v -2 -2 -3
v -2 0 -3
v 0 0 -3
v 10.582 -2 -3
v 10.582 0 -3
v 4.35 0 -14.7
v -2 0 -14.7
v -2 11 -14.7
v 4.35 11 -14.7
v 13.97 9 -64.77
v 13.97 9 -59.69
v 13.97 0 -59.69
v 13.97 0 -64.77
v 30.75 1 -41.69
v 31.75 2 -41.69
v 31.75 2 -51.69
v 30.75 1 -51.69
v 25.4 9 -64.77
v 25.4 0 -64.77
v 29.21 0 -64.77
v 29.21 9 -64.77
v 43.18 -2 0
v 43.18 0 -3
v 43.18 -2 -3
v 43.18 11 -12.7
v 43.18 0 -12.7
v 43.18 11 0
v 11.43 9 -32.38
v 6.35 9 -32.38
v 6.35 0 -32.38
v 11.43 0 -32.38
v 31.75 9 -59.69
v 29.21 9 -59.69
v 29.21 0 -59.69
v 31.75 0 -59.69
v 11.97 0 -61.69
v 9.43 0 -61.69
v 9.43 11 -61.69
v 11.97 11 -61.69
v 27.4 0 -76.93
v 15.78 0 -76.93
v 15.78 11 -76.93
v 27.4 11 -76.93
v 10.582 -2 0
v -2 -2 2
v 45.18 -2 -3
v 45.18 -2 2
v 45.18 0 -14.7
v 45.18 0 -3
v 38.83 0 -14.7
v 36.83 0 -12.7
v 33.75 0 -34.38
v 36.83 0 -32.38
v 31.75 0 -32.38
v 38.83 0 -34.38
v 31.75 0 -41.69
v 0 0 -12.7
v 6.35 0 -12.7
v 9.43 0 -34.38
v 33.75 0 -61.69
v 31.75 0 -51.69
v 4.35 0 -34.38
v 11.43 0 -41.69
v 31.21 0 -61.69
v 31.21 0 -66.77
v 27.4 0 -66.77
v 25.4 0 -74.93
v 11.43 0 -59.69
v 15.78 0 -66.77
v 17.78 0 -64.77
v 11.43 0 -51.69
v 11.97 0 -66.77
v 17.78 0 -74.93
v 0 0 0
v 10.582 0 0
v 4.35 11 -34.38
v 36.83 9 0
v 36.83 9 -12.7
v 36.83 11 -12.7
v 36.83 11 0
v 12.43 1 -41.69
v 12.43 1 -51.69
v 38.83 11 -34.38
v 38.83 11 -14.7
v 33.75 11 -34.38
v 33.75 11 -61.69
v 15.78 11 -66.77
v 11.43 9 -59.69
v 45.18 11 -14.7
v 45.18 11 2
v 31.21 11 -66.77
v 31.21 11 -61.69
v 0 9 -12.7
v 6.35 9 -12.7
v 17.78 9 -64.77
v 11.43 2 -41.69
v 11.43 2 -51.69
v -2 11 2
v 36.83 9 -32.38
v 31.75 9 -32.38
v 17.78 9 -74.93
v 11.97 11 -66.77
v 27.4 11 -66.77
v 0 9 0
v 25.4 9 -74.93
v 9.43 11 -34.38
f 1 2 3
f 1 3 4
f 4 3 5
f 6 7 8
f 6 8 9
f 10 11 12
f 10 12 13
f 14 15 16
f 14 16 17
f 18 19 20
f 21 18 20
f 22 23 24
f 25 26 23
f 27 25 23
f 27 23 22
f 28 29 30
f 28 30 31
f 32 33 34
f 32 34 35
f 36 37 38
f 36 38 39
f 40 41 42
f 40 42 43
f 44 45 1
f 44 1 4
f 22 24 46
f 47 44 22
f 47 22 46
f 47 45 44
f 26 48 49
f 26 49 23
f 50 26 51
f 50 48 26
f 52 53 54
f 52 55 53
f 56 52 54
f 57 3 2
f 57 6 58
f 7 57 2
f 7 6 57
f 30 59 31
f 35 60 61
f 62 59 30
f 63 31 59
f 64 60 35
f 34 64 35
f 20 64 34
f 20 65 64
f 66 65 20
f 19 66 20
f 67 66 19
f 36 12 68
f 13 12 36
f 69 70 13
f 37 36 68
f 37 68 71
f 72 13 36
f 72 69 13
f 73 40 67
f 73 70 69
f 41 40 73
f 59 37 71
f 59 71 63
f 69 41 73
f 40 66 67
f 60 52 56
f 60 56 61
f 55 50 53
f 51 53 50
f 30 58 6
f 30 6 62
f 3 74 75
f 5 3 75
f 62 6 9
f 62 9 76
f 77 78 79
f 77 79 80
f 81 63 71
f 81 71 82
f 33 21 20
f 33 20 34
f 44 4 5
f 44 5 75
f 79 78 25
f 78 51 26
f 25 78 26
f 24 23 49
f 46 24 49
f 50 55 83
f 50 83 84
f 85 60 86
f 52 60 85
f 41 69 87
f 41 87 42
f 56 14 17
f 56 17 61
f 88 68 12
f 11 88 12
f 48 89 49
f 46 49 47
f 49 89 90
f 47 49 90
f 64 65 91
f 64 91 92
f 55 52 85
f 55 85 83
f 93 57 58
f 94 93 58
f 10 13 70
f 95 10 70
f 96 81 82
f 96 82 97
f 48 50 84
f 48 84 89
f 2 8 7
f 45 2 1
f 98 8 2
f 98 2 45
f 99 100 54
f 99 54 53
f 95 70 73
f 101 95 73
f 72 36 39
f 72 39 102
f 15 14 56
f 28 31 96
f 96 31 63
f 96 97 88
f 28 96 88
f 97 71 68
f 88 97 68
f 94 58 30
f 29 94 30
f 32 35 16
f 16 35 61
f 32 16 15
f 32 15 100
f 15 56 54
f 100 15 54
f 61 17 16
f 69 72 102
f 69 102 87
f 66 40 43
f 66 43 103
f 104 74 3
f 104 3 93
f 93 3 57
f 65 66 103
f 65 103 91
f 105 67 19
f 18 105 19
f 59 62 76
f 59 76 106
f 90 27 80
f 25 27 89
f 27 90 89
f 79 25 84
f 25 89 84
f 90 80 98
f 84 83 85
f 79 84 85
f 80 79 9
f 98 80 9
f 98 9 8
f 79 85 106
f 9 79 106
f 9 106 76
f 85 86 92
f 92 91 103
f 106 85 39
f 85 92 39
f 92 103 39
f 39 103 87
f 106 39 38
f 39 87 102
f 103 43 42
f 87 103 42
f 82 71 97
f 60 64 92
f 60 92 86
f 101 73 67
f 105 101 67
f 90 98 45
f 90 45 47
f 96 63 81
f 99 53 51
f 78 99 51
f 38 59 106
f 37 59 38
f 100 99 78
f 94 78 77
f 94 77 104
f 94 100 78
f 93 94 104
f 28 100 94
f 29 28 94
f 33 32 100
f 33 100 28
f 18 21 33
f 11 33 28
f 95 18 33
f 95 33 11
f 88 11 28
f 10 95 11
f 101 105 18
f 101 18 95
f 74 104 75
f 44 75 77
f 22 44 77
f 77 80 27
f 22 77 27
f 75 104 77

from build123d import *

# Parameters (mm, degrees)
BOSS_EXTRUDE2_DEPTH     = 9
BOSS_EXTRUDE3_DEPTH     = 2
SKETCH3_W               = 47.18
SKETCH3_H               = 5
BOSS_EXTRUDE4_DEPTH     = 2
SKETCH5_W               = 6.35
SKETCH5_H               = 12.7
CUT_EXTRUDE1_DEPTH      = 12
CUT_EXTRUDE1_DEPTH_BACK = 10
BOSS_EXTRUDE5_START     = 8
BOSS_EXTRUDE5_DEPTH     = 10
BOSS_EXTRUDE6_START     = 8
BOSS_EXTRUDE6_DEPTH     = 10
CUT_EXTRUDE2_DEPTH      = 8


with BuildPart() as part:
    # Sketch1 → Boss-Extrude2 (new body)
    with BuildSketch(Plane(origin=(0, 0, 0), x_dir=(1, 0, 0), z_dir=(0, 1, 0))):
        Polygon((9.43, 34.38), (9.43, 61.69), (11.97, 61.69), (11.97, 66.77), (15.78, 66.77), (15.78, 76.93), (27.4, 76.93), (27.4, 66.77), (31.21, 66.77), (31.21, 61.69), (33.75, 61.69), (33.75, 34.38), (38.83, 34.38), (38.83, 14.7), (45.18, 14.7), (45.18, -2), (-2, -2), (-2, 14.7), (4.35, 14.7), (4.35, 34.38), align=None)
        Polygon((0, 0), (0, 12.7), (6.35, 12.7), (6.35, 32.38), (11.43, 32.38), (11.43, 59.69), (13.97, 59.69), (13.97, 64.77), (17.78, 64.77), (17.78, 74.93), (25.4, 74.93), (25.4, 64.77), (29.21, 64.77), (29.21, 59.69), (31.75, 59.69), (31.75, 32.38), (36.83, 32.38), (36.83, 12.7), (43.18, 12.7), (43.18, 0), align=None, mode=Mode.SUBTRACT)
    extrude(amount=BOSS_EXTRUDE2_DEPTH)

    # Sketch2 → Boss-Extrude3 (add)
    with BuildSketch(Plane(origin=(0, 9, 0), x_dir=(1, 0, 0), z_dir=(0, 1, 0))):
        Polygon((-2, -2), (-2, 14.7), (4.35, 14.7), (4.35, 34.38), (9.43, 34.38), (9.43, 61.69), (11.97, 61.69), (11.97, 66.77), (15.78, 66.77), (15.78, 76.93), (27.4, 76.93), (27.4, 66.77), (31.21, 66.77), (31.21, 61.69), (33.75, 61.69), (33.75, 34.38), (38.83, 34.38), (38.83, 14.7), (45.18, 14.7), (45.18, -2), align=None)
    extrude(amount=BOSS_EXTRUDE3_DEPTH)

    # Sketch3 → Boss-Extrude4 (add)
    with BuildSketch(Plane.XZ):
        with Locations((21.59, -0.5)):
            Rectangle(SKETCH3_W, SKETCH3_H)
    extrude(amount=BOSS_EXTRUDE4_DEPTH)

    # Sketch5 → Cut-Extrude1 (cut, two sides)
    with BuildSketch(Plane.XZ.offset(-9)) as cut_extrude1_sk:
        with Locations((40.005, -6.35)):
            Rectangle(SKETCH5_W, SKETCH5_H)
    extrude(amount=CUT_EXTRUDE1_DEPTH, mode=Mode.SUBTRACT)
    extrude(cut_extrude1_sk.sketch, amount=-CUT_EXTRUDE1_DEPTH_BACK, mode=Mode.SUBTRACT)

    # Sketch8 → Boss-Extrude5 (add)
    with BuildSketch(Plane.XY.offset(-59.69).offset(BOSS_EXTRUDE5_START)):
        Polygon((11.43, 0), (12.43, 1), (11.43, 2), (11.43, 1), align=None)
    extrude(amount=BOSS_EXTRUDE5_DEPTH)

    # Sketch9 → Boss-Extrude6 (add)
    with BuildSketch(Plane.XY.offset(-59.69).offset(BOSS_EXTRUDE6_START)):
        Polygon((31.75, 0), (31.75, 1), (31.75, 2), (30.75, 1), align=None)
    extrude(amount=BOSS_EXTRUDE6_DEPTH)

    # Sketch10 → Cut-Extrude2 (cut)
    with BuildSketch(Plane.XZ.offset(2)):
        Polygon((31.270231455, -3), (10.582199871, -3), (10.582199871, 0), (31.270231455, 0), (42.389768545, 0), (42.389768545, -6), (31.270231455, -6), align=None)
    extrude(amount=-CUT_EXTRUDE2_DEPTH, mode=Mode.SUBTRACT)


solid = part.part
